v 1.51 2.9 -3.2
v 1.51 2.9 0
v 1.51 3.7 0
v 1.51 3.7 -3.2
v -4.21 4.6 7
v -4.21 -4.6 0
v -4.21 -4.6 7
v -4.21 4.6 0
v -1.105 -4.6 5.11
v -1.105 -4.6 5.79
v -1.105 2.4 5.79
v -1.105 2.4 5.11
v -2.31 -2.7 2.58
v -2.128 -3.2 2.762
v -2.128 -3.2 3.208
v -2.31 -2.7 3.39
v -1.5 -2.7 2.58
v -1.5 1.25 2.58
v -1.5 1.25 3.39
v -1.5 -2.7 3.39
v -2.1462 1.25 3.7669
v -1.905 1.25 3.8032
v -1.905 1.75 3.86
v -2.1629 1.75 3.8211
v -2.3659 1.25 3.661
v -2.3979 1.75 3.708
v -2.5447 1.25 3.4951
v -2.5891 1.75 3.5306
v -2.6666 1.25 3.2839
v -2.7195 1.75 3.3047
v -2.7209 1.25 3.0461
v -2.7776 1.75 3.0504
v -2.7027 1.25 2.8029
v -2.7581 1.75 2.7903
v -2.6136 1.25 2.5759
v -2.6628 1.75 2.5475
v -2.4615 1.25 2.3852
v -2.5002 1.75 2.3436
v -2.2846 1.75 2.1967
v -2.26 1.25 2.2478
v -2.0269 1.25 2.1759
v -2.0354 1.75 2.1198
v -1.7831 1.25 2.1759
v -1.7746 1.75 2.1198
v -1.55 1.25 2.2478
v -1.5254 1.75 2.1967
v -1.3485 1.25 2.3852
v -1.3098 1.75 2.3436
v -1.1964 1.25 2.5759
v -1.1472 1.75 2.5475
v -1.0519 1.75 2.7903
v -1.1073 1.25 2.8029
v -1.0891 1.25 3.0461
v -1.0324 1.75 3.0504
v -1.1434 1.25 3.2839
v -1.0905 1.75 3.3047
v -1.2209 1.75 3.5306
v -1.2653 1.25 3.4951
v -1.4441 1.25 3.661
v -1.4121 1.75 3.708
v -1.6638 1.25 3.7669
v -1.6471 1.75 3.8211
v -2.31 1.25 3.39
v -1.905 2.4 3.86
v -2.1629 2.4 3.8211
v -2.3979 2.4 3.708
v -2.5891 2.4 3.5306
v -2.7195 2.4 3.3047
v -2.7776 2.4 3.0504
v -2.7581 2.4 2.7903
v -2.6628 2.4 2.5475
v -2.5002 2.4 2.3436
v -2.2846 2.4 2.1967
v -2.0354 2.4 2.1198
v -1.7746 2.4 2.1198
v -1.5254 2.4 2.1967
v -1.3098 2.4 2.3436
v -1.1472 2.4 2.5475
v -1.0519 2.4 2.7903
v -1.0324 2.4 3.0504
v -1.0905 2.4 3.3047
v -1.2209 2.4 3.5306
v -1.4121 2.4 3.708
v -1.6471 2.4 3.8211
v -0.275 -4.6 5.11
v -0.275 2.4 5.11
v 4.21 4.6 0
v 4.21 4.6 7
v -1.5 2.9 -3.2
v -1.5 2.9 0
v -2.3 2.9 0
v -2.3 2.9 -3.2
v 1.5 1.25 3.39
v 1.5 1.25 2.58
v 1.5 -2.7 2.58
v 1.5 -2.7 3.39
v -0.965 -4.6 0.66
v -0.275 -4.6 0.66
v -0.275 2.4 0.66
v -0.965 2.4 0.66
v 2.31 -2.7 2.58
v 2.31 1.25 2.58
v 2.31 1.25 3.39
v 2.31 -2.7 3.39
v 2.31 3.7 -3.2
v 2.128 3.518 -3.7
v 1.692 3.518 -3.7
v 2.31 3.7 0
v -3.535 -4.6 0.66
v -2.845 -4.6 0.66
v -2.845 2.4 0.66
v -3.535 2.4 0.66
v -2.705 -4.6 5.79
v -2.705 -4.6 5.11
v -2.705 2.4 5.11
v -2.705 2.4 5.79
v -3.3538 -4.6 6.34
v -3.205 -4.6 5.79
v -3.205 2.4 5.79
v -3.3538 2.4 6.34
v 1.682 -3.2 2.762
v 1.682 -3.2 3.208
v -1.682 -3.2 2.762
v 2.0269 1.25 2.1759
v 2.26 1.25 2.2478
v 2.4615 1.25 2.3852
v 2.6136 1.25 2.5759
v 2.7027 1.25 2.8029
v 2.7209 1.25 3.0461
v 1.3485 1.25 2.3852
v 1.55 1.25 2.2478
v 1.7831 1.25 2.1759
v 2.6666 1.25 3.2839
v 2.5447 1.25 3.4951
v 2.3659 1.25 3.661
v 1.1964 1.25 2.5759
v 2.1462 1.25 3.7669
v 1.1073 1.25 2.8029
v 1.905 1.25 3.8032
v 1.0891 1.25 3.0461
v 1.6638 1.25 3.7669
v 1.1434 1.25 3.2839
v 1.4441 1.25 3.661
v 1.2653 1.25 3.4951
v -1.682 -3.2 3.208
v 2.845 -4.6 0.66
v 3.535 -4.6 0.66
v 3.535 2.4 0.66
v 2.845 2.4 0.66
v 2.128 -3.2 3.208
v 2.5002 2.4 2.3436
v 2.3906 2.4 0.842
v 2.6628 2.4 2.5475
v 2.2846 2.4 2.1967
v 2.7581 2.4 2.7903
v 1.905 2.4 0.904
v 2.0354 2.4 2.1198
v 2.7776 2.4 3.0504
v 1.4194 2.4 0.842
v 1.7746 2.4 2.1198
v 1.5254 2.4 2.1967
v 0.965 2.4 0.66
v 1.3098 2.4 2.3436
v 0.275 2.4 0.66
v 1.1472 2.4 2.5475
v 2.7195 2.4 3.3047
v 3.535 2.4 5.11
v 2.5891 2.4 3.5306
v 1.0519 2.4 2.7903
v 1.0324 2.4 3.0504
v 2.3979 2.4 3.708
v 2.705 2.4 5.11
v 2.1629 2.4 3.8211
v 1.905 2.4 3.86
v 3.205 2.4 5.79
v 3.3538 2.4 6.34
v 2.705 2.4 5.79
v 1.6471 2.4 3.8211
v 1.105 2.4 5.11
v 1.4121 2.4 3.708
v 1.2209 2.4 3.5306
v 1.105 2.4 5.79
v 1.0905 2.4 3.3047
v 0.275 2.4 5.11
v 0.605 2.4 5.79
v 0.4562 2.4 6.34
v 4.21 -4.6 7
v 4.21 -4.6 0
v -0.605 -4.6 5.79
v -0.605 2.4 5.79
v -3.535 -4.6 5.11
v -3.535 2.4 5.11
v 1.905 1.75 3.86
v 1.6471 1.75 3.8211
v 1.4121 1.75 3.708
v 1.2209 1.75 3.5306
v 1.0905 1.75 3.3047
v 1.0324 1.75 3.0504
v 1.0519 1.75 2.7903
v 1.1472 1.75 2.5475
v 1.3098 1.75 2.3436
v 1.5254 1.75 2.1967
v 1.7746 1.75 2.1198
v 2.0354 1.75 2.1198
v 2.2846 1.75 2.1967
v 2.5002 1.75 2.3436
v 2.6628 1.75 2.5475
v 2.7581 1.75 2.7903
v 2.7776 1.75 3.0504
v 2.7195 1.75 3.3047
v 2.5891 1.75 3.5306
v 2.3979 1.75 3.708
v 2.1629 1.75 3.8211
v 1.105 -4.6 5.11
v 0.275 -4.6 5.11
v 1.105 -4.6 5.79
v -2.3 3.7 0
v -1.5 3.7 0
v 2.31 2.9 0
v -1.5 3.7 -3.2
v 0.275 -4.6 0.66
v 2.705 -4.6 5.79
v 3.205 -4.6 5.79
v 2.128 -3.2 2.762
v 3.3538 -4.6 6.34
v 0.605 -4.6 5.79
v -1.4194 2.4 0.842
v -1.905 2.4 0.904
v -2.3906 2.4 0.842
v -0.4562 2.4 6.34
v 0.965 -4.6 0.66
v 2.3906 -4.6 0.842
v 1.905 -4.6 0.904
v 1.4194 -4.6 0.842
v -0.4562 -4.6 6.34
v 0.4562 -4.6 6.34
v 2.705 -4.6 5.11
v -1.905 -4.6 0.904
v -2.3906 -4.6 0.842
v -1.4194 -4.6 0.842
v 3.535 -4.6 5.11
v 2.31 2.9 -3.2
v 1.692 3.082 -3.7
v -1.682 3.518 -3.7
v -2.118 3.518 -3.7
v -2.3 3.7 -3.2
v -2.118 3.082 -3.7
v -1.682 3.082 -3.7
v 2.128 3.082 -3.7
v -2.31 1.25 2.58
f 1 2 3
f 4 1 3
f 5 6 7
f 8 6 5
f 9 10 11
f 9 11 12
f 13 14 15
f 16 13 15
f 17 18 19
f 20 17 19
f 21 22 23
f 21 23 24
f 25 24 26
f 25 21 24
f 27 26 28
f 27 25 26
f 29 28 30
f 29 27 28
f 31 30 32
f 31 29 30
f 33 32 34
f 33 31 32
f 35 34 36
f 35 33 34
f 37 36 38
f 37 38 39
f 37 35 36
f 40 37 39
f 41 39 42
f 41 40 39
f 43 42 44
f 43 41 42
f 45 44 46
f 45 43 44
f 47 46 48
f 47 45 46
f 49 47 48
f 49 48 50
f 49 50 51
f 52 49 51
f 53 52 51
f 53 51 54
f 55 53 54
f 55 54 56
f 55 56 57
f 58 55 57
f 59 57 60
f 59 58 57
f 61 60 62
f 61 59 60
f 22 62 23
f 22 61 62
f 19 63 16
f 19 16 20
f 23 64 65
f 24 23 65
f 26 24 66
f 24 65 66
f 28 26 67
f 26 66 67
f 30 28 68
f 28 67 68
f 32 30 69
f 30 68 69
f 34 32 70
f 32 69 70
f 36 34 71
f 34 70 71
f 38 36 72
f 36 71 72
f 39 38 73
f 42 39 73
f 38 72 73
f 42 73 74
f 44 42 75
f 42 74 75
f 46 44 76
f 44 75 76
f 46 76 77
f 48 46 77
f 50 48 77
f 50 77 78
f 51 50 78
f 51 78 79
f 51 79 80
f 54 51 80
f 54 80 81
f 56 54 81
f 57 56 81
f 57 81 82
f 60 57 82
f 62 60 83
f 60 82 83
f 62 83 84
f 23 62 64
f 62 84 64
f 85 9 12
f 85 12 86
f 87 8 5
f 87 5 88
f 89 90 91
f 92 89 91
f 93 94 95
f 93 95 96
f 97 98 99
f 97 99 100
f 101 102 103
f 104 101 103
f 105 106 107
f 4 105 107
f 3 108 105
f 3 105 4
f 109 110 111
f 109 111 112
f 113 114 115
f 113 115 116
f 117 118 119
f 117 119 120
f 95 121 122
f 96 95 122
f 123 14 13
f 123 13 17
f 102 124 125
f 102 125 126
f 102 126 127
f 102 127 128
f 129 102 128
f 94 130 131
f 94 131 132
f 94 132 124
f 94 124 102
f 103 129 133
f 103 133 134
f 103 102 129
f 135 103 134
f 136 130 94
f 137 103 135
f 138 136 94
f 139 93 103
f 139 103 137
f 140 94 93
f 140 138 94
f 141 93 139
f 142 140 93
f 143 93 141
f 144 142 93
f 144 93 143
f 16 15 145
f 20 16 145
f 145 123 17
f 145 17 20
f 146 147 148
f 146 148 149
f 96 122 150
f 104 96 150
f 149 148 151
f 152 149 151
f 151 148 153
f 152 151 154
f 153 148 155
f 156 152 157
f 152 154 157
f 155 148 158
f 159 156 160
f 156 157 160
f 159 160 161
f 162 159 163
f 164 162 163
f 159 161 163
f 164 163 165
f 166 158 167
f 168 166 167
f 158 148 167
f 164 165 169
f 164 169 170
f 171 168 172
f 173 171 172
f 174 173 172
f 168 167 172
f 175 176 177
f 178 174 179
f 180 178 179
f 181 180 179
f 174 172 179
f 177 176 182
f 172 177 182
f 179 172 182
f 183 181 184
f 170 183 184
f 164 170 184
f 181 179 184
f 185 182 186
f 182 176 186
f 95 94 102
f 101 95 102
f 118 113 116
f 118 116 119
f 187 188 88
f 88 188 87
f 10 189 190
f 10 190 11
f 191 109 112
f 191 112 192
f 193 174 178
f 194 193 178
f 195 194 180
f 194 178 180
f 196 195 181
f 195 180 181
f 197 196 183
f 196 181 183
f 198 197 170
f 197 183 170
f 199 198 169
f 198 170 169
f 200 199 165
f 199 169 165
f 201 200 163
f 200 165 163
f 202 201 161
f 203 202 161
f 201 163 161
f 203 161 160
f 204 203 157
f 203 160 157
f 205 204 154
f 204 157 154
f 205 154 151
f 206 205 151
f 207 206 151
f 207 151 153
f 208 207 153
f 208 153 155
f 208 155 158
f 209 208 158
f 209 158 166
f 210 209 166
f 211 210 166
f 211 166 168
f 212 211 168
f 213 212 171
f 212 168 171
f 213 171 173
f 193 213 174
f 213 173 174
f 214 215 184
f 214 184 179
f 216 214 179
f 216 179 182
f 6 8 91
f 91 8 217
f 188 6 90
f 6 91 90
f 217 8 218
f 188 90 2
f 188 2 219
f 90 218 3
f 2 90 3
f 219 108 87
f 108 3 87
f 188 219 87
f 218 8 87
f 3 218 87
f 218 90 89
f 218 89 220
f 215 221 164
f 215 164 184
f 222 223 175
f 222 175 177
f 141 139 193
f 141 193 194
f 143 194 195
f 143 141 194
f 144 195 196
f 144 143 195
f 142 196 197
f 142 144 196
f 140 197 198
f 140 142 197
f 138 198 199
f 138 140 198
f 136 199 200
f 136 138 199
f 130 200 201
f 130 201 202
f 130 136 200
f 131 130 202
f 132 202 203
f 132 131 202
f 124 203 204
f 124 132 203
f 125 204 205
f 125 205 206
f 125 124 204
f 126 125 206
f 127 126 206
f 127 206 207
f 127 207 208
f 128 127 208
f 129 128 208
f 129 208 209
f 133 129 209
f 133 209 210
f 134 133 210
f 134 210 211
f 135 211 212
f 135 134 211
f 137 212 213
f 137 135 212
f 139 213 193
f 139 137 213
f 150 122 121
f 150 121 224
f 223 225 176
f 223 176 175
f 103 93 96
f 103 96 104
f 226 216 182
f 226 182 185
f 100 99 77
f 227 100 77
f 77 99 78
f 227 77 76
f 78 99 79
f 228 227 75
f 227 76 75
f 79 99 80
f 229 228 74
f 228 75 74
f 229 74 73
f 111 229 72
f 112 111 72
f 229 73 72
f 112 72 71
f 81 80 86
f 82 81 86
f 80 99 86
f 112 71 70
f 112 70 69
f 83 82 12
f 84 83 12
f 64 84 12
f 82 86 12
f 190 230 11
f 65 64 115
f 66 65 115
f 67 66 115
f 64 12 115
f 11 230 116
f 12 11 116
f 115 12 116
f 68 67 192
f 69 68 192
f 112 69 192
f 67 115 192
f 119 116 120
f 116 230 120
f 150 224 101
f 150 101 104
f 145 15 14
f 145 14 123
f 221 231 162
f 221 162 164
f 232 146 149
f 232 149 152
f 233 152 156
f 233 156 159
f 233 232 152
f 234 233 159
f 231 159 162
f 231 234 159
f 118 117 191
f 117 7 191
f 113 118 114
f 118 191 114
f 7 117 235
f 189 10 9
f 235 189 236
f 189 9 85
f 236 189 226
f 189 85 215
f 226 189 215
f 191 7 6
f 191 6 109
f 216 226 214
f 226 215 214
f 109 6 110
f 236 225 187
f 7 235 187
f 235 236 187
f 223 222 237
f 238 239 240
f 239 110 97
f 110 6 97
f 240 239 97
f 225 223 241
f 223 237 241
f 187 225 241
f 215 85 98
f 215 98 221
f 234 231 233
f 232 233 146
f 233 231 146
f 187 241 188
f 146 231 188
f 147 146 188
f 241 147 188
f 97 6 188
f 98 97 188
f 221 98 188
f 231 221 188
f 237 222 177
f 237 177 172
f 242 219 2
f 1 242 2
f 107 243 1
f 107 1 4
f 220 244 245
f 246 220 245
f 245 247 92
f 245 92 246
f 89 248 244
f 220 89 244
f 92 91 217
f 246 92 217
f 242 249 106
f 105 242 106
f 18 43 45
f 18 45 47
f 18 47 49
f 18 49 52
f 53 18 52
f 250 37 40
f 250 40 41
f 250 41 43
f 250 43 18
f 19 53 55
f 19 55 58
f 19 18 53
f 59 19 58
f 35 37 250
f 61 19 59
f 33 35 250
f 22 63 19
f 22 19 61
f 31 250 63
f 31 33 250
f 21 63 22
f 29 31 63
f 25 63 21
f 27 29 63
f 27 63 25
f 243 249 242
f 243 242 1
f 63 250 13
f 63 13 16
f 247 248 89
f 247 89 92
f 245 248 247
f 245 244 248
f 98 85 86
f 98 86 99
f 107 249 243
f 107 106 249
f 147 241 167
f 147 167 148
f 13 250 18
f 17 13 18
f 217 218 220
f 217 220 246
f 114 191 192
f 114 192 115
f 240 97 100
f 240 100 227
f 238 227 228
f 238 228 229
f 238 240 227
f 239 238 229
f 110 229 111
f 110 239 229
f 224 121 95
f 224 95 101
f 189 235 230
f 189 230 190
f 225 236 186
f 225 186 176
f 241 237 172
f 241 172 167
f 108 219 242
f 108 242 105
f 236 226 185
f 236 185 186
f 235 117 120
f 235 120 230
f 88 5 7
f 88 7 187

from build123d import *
from OCP.BRepFilletAPI import BRepFilletAPI_MakeChamfer

# Parameters (mm, degrees)
SKETCH1_W                    = 8.42
SKETCH1_H                    = 9.2
BOSS_EXTRUDE1_DEPTH          = 7
CUT_EXTRUDE1_DEPTH           = 7
LPATTERN1_COUNT              = 2
LPATTERN1_PITCH              = 3.81
SKETCH3_R                    = 0.875
BOSS_EXTRUDE2_DEPTH          = 1.15
CHAMFER1_SIZE                = 0.5
CHAMFER1_SIZE2               = 0.056791013
SKETCH4_W                    = 0.81
SKETCH4_H                    = 0.81
BOSS_EXTRUDE3_DEPTH          = 4.45
CHAMFER2_SIZE                = 0.5
CHAMFER2_SIZE2               = 0.181985117
LPATTERN3_COUNT              = 2
LPATTERN3_PITCH              = 3.81
CHAMFER1_OF_LPATTERN3_SIZE2  = 0.056791013
CHAMFER1_OF_LPATTERN3_SIZE   = 0.5
LPATTERN4_COUNT              = 2
LPATTERN4_PITCH              = 3.81
CHAMFER2_OF_LPATTERN4_SIZE   = 0.5
CHAMFER2_OF_LPATTERN4_SIZE2  = 0.181985117
BOSS_EXTRUDE4_START          = -3.4
SKETCH5_W                    = 0.8
SKETCH5_H                    = 0.8
BOSS_EXTRUDE4_DEPTH          = 7.1
CHAMFER3_SIZE                = 0.5
CHAMFER3_SIZE2               = 0.181985117
LPATTERN12_COUNT             = 2
LPATTERN12_PITCH             = 3.81
CHAMFER3_OF_LPATTERN12_SIZE  = 0.5
CHAMFER3_OF_LPATTERN12_SIZE2 = 0.181985117


with BuildPart() as part:
    # Sketch1 → Boss-Extrude1 (new body)
    with BuildSketch(Plane.XY):
        Rectangle(SKETCH1_W, SKETCH1_H)
    extrude(amount=BOSS_EXTRUDE1_DEPTH)

    # Sketch2 → Cut-Extrude1 (cut)
    with BuildSketch(Plane.XZ.offset(4.6)):
        with BuildLine():
            Line((-3.535, 5.11), (-2.705, 5.11))
            Line((-2.705, 5.11), (-2.705, 5.79))
            Line((-2.705, 5.79), (-3.205, 5.79))
            Line((-3.205, 5.79), (-3.353813394, 6.34))
            Line((-3.353813394, 6.34), (-0.456186606, 6.34))
            Line((-0.456186606, 6.34), (-0.605, 5.79))
            Line((-0.605, 5.79), (-1.105, 5.79))
            Line((-1.105, 5.79), (-1.105, 5.11))
            Line((-1.105, 5.11), (-0.275, 5.11))
            Line((-0.275, 5.11), (-0.275, 0.66))
            Line((-0.275, 0.66), (-0.965, 0.66))
            ThreePointArc((-0.965, 0.66), (-1.905, 0.904), (-2.845, 0.66))
            Line((-2.845, 0.66), (-3.535, 0.66))
            Line((-3.535, 0.66), (-3.535, 5.11))
        make_face()
    cut_extrude1 = extrude(amount=-CUT_EXTRUDE1_DEPTH, mode=Mode.SUBTRACT)

    # LPattern1: Cut-Extrude1 ×2
    with Locations(*[(i * LPATTERN1_PITCH, 0, 0) for i in range(1, LPATTERN1_COUNT)]):
        add(cut_extrude1, mode=Mode.SUBTRACT)

    # Sketch3 → Boss-Extrude2 (add)
    with BuildSketch(Plane.XZ.offset(-2.4)):
        with Locations(Location((-1.905, 2.985, 0), (0, 0, 90))):
            Circle(SKETCH3_R)
    boss_extrude2 = extrude(amount=BOSS_EXTRUDE2_DEPTH)

    # Chamfer1
    chamfer1_edges = [part.edges().sort_by_distance(p)[0] for p in [
        (-1.905, 1.25, 2.11),
    ]]
    chamfer1_side = [part.faces().sort_by_distance(p)[0] for p in [
        (-1.905, 1.825, 2.11),
    ]]
    chamfer(chamfer1_edges, length=CHAMFER1_SIZE, length2=CHAMFER1_SIZE2, reference=chamfer1_side[0])

    # Sketch4 → Boss-Extrude3 (add)
    with BuildSketch(Plane.XZ.offset(-1.25)):
        with Locations((-1.905, 2.985)):
            Rectangle(SKETCH4_W, SKETCH4_H)
    boss_extrude3 = extrude(amount=BOSS_EXTRUDE3_DEPTH)

    # Chamfer2: one chamfer whose edges measure the first distance from different faces: ONE call of the kernel's chamfer builder (chamfer() names one face for all edges)
    chamfer2_edges_1 = [part.edges().sort_by_distance(p)[0] for p in [
        (-1.5, -3.2, 2.985),
    ]]
    chamfer2_side_1 = [part.faces().sort_by_distance(p)[0] for p in [
        (-1.5, -0.975, 2.985),
    ]]
    chamfer2_edges_2 = [part.edges().sort_by_distance(p)[0] for p in [
        (-1.905, -3.2, 3.39),
    ]]
    chamfer2_side_2 = [part.faces().sort_by_distance(p)[0] for p in [
        (-1.905, -0.975, 3.39),
    ]]
    chamfer2_edges_3 = [part.edges().sort_by_distance(p)[0] for p in [
        (-2.31, -3.2, 2.985),
    ]]
    chamfer2_side_3 = [part.faces().sort_by_distance(p)[0] for p in [
        (-2.31, -0.975, 2.985),
    ]]
    chamfer2_edges_4 = [part.edges().sort_by_distance(p)[0] for p in [
        (-1.905, -3.2, 2.58),
    ]]
    chamfer2_side_4 = [part.faces().sort_by_distance(p)[0] for p in [
        (-1.905, -0.975, 2.58),
    ]]
    chamfer2 = BRepFilletAPI_MakeChamfer(part.part.solid().wrapped)
    for e in chamfer2_edges_1:
        chamfer2.Add(CHAMFER2_SIZE, CHAMFER2_SIZE2, e.wrapped, chamfer2_side_1[0].wrapped)  # the first distance lies on this face
    for e in chamfer2_edges_2:
        chamfer2.Add(CHAMFER2_SIZE, CHAMFER2_SIZE2, e.wrapped, chamfer2_side_2[0].wrapped)  # the first distance lies on this face
    for e in chamfer2_edges_3:
        chamfer2.Add(CHAMFER2_SIZE, CHAMFER2_SIZE2, e.wrapped, chamfer2_side_3[0].wrapped)  # the first distance lies on this face
    for e in chamfer2_edges_4:
        chamfer2.Add(CHAMFER2_SIZE, CHAMFER2_SIZE2, e.wrapped, chamfer2_side_4[0].wrapped)  # the first distance lies on this face
    add(Compound.cast(chamfer2.Shape()), mode=Mode.REPLACE)

    # LPattern3: Boss-Extrude2 ×2
    with Locations(*[(i * LPATTERN3_PITCH, 0, 0) for i in range(1, LPATTERN3_COUNT)]):
        add(boss_extrude2)

    # Chamfer1 of LPattern3
    chamfer1_of_lpattern3_edges = [part.edges().sort_by_distance(p)[0] for p in [
        (1.905, 1.25, 2.11),
    ]]
    chamfer(chamfer1_of_lpattern3_edges, length=CHAMFER1_OF_LPATTERN3_SIZE, length2=CHAMFER1_OF_LPATTERN3_SIZE2)

    # LPattern4: Boss-Extrude3 ×2
    with Locations(*[(i * LPATTERN4_PITCH, 0, 0) for i in range(1, LPATTERN4_COUNT)]):
        add(boss_extrude3)

    # Chamfer2 of LPattern4: one chamfer whose edges measure the first distance from different faces: ONE call of the kernel's chamfer builder (chamfer() names one face for all edges)
    chamfer2_of_lpattern4_edges_1 = [part.edges().sort_by_distance(p)[0] for p in [
        (2.31, -3.2, 2.985),
    ]]
    chamfer2_of_lpattern4_side_1 = [part.faces().sort_by_distance(p)[0] for p in [
        (2.31, -0.975, 2.985),
    ]]
    chamfer2_of_lpattern4_edges_2 = [part.edges().sort_by_distance(p)[0] for p in [
        (1.905, -3.2, 3.39),
    ]]
    chamfer2_of_lpattern4_side_2 = [part.faces().sort_by_distance(p)[0] for p in [
        (1.905, -0.975, 3.39),
    ]]
    chamfer2_of_lpattern4_edges_3 = [part.edges().sort_by_distance(p)[0] for p in [
        (1.5, -3.2, 2.985),
    ]]
    chamfer2_of_lpattern4_side_3 = [part.faces().sort_by_distance(p)[0] for p in [
        (1.5, -0.975, 2.985),
    ]]
    chamfer2_of_lpattern4_edges_4 = [part.edges().sort_by_distance(p)[0] for p in [
        (1.905, -3.2, 2.58),
    ]]
    chamfer2_of_lpattern4_side_4 = [part.faces().sort_by_distance(p)[0] for p in [
        (1.905, -0.975, 2.58),
    ]]
    chamfer2_of_lpattern4 = BRepFilletAPI_MakeChamfer(part.part.solid().wrapped)
    for e in chamfer2_of_lpattern4_edges_1:
        chamfer2_of_lpattern4.Add(CHAMFER2_OF_LPATTERN4_SIZE, CHAMFER2_OF_LPATTERN4_SIZE2, e.wrapped, chamfer2_of_lpattern4_side_1[0].wrapped)  # the first distance lies on this face
    for e in chamfer2_of_lpattern4_edges_2:
        chamfer2_of_lpattern4.Add(CHAMFER2_OF_LPATTERN4_SIZE, CHAMFER2_OF_LPATTERN4_SIZE2, e.wrapped, chamfer2_of_lpattern4_side_2[0].wrapped)  # the first distance lies on this face
    for e in chamfer2_of_lpattern4_edges_3:
        chamfer2_of_lpattern4.Add(CHAMFER2_OF_LPATTERN4_SIZE, CHAMFER2_OF_LPATTERN4_SIZE2, e.wrapped, chamfer2_of_lpattern4_side_3[0].wrapped)  # the first distance lies on this face
    for e in chamfer2_of_lpattern4_edges_4:
        chamfer2_of_lpattern4.Add(CHAMFER2_OF_LPATTERN4_SIZE, CHAMFER2_OF_LPATTERN4_SIZE2, e.wrapped, chamfer2_of_lpattern4_side_4[0].wrapped)  # the first distance lies on this face
    add(Compound.cast(chamfer2_of_lpattern4.Shape()), mode=Mode.REPLACE)

    # Sketch5 → Boss-Extrude4 (add)
    with BuildSketch(Plane(origin=(0, 0, 0), x_dir=(-1, 0, 0), z_dir=(0, 0, -1)).offset(BOSS_EXTRUDE4_START)):
        with Locations((1.9, 3.3)):
            Rectangle(SKETCH5_W, SKETCH5_H)
    boss_extrude4 = extrude(amount=BOSS_EXTRUDE4_DEPTH)

    # Chamfer3: one chamfer whose edges measure the first distance from different faces: ONE call of the kernel's chamfer builder (chamfer() names one face for all edges)
    chamfer3_edges_1 = [part.edges().sort_by_distance(p)[0] for p in [
        (-1.9, 2.9, -3.7),
    ]]
    chamfer3_side_1 = [part.faces().sort_by_distance(p)[0] for p in [
        (-1.9, 2.9, -1.85),
    ]]
    chamfer3_edges_2 = [part.edges().sort_by_distance(p)[0] for p in [
        (-1.5, 3.3, -3.7),
    ]]
    chamfer3_side_2 = [part.faces().sort_by_distance(p)[0] for p in [
        (-1.5, 3.3, -1.85),
    ]]
    chamfer3_edges_3 = [part.edges().sort_by_distance(p)[0] for p in [
        (-2.3, 3.3, -3.7),
    ]]
    chamfer3_side_3 = [part.faces().sort_by_distance(p)[0] for p in [
        (-2.3, 3.3, -1.85),
    ]]
    chamfer3_edges_4 = [part.edges().sort_by_distance(p)[0] for p in [
        (-1.9, 3.7, -3.7),
    ]]
    chamfer3_side_4 = [part.faces().sort_by_distance(p)[0] for p in [
        (-1.9, 3.7, -1.85),
    ]]
    chamfer3 = BRepFilletAPI_MakeChamfer(part.part.solid().wrapped)
    for e in chamfer3_edges_1:
        chamfer3.Add(CHAMFER3_SIZE, CHAMFER3_SIZE2, e.wrapped, chamfer3_side_1[0].wrapped)  # the first distance lies on this face
    for e in chamfer3_edges_2:
        chamfer3.Add(CHAMFER3_SIZE, CHAMFER3_SIZE2, e.wrapped, chamfer3_side_2[0].wrapped)  # the first distance lies on this face
    for e in chamfer3_edges_3:
        chamfer3.Add(CHAMFER3_SIZE, CHAMFER3_SIZE2, e.wrapped, chamfer3_side_3[0].wrapped)  # the first distance lies on this face
    for e in chamfer3_edges_4:
        chamfer3.Add(CHAMFER3_SIZE, CHAMFER3_SIZE2, e.wrapped, chamfer3_side_4[0].wrapped)  # the first distance lies on this face
    add(Compound.cast(chamfer3.Shape()), mode=Mode.REPLACE)

    # LPattern12: Boss-Extrude4 ×2
    with Locations(*[(i * LPATTERN12_PITCH, 0, 0) for i in range(1, LPATTERN12_COUNT)]):
        add(boss_extrude4)

    # Chamfer3 of LPattern12: one chamfer whose edges measure the first distance from different faces: ONE call of the kernel's chamfer builder (chamfer() names one face for all edges)
    chamfer3_of_lpattern12_edges_1 = [part.edges().sort_by_distance(p)[0] for p in [
        (1.91, 2.9, -3.7),
    ]]
    chamfer3_of_lpattern12_side_1 = [part.faces().sort_by_distance(p)[0] for p in [
        (1.91, 2.9, -1.85),
    ]]
    chamfer3_of_lpattern12_edges_2 = [part.edges().sort_by_distance(p)[0] for p in [
        (2.31, 3.3, -3.7),
    ]]
    chamfer3_of_lpattern12_side_2 = [part.faces().sort_by_distance(p)[0] for p in [
        (2.31, 3.3, -1.85),
    ]]
    chamfer3_of_lpattern12_edges_3 = [part.edges().sort_by_distance(p)[0] for p in [
        (1.51, 3.3, -3.7),
    ]]
    chamfer3_of_lpattern12_side_3 = [part.faces().sort_by_distance(p)[0] for p in [
        (1.51, 3.3, -1.85),
    ]]
    chamfer3_of_lpattern12_edges_4 = [part.edges().sort_by_distance(p)[0] for p in [
        (1.91, 3.7, -3.7),
    ]]
    chamfer3_of_lpattern12_side_4 = [part.faces().sort_by_distance(p)[0] for p in [
        (1.91, 3.7, -1.85),
    ]]
    chamfer3_of_lpattern12 = BRepFilletAPI_MakeChamfer(part.part.solid().wrapped)
    for e in chamfer3_of_lpattern12_edges_1:
        chamfer3_of_lpattern12.Add(CHAMFER3_OF_LPATTERN12_SIZE, CHAMFER3_OF_LPATTERN12_SIZE2, e.wrapped, chamfer3_of_lpattern12_side_1[0].wrapped)  # the first distance lies on this face
    for e in chamfer3_of_lpattern12_edges_2:
        chamfer3_of_lpattern12.Add(CHAMFER3_OF_LPATTERN12_SIZE, CHAMFER3_OF_LPATTERN12_SIZE2, e.wrapped, chamfer3_of_lpattern12_side_2[0].wrapped)  # the first distance lies on this face
    for e in chamfer3_of_lpattern12_edges_3:
        chamfer3_of_lpattern12.Add(CHAMFER3_OF_LPATTERN12_SIZE, CHAMFER3_OF_LPATTERN12_SIZE2, e.wrapped, chamfer3_of_lpattern12_side_3[0].wrapped)  # the first distance lies on this face
    for e in chamfer3_of_lpattern12_edges_4:
        chamfer3_of_lpattern12.Add(CHAMFER3_OF_LPATTERN12_SIZE, CHAMFER3_OF_LPATTERN12_SIZE2, e.wrapped, chamfer3_of_lpattern12_side_4[0].wrapped)  # the first distance lies on this face
    add(Compound.cast(chamfer3_of_lpattern12.Shape()), mode=Mode.REPLACE)


solid = part.part
